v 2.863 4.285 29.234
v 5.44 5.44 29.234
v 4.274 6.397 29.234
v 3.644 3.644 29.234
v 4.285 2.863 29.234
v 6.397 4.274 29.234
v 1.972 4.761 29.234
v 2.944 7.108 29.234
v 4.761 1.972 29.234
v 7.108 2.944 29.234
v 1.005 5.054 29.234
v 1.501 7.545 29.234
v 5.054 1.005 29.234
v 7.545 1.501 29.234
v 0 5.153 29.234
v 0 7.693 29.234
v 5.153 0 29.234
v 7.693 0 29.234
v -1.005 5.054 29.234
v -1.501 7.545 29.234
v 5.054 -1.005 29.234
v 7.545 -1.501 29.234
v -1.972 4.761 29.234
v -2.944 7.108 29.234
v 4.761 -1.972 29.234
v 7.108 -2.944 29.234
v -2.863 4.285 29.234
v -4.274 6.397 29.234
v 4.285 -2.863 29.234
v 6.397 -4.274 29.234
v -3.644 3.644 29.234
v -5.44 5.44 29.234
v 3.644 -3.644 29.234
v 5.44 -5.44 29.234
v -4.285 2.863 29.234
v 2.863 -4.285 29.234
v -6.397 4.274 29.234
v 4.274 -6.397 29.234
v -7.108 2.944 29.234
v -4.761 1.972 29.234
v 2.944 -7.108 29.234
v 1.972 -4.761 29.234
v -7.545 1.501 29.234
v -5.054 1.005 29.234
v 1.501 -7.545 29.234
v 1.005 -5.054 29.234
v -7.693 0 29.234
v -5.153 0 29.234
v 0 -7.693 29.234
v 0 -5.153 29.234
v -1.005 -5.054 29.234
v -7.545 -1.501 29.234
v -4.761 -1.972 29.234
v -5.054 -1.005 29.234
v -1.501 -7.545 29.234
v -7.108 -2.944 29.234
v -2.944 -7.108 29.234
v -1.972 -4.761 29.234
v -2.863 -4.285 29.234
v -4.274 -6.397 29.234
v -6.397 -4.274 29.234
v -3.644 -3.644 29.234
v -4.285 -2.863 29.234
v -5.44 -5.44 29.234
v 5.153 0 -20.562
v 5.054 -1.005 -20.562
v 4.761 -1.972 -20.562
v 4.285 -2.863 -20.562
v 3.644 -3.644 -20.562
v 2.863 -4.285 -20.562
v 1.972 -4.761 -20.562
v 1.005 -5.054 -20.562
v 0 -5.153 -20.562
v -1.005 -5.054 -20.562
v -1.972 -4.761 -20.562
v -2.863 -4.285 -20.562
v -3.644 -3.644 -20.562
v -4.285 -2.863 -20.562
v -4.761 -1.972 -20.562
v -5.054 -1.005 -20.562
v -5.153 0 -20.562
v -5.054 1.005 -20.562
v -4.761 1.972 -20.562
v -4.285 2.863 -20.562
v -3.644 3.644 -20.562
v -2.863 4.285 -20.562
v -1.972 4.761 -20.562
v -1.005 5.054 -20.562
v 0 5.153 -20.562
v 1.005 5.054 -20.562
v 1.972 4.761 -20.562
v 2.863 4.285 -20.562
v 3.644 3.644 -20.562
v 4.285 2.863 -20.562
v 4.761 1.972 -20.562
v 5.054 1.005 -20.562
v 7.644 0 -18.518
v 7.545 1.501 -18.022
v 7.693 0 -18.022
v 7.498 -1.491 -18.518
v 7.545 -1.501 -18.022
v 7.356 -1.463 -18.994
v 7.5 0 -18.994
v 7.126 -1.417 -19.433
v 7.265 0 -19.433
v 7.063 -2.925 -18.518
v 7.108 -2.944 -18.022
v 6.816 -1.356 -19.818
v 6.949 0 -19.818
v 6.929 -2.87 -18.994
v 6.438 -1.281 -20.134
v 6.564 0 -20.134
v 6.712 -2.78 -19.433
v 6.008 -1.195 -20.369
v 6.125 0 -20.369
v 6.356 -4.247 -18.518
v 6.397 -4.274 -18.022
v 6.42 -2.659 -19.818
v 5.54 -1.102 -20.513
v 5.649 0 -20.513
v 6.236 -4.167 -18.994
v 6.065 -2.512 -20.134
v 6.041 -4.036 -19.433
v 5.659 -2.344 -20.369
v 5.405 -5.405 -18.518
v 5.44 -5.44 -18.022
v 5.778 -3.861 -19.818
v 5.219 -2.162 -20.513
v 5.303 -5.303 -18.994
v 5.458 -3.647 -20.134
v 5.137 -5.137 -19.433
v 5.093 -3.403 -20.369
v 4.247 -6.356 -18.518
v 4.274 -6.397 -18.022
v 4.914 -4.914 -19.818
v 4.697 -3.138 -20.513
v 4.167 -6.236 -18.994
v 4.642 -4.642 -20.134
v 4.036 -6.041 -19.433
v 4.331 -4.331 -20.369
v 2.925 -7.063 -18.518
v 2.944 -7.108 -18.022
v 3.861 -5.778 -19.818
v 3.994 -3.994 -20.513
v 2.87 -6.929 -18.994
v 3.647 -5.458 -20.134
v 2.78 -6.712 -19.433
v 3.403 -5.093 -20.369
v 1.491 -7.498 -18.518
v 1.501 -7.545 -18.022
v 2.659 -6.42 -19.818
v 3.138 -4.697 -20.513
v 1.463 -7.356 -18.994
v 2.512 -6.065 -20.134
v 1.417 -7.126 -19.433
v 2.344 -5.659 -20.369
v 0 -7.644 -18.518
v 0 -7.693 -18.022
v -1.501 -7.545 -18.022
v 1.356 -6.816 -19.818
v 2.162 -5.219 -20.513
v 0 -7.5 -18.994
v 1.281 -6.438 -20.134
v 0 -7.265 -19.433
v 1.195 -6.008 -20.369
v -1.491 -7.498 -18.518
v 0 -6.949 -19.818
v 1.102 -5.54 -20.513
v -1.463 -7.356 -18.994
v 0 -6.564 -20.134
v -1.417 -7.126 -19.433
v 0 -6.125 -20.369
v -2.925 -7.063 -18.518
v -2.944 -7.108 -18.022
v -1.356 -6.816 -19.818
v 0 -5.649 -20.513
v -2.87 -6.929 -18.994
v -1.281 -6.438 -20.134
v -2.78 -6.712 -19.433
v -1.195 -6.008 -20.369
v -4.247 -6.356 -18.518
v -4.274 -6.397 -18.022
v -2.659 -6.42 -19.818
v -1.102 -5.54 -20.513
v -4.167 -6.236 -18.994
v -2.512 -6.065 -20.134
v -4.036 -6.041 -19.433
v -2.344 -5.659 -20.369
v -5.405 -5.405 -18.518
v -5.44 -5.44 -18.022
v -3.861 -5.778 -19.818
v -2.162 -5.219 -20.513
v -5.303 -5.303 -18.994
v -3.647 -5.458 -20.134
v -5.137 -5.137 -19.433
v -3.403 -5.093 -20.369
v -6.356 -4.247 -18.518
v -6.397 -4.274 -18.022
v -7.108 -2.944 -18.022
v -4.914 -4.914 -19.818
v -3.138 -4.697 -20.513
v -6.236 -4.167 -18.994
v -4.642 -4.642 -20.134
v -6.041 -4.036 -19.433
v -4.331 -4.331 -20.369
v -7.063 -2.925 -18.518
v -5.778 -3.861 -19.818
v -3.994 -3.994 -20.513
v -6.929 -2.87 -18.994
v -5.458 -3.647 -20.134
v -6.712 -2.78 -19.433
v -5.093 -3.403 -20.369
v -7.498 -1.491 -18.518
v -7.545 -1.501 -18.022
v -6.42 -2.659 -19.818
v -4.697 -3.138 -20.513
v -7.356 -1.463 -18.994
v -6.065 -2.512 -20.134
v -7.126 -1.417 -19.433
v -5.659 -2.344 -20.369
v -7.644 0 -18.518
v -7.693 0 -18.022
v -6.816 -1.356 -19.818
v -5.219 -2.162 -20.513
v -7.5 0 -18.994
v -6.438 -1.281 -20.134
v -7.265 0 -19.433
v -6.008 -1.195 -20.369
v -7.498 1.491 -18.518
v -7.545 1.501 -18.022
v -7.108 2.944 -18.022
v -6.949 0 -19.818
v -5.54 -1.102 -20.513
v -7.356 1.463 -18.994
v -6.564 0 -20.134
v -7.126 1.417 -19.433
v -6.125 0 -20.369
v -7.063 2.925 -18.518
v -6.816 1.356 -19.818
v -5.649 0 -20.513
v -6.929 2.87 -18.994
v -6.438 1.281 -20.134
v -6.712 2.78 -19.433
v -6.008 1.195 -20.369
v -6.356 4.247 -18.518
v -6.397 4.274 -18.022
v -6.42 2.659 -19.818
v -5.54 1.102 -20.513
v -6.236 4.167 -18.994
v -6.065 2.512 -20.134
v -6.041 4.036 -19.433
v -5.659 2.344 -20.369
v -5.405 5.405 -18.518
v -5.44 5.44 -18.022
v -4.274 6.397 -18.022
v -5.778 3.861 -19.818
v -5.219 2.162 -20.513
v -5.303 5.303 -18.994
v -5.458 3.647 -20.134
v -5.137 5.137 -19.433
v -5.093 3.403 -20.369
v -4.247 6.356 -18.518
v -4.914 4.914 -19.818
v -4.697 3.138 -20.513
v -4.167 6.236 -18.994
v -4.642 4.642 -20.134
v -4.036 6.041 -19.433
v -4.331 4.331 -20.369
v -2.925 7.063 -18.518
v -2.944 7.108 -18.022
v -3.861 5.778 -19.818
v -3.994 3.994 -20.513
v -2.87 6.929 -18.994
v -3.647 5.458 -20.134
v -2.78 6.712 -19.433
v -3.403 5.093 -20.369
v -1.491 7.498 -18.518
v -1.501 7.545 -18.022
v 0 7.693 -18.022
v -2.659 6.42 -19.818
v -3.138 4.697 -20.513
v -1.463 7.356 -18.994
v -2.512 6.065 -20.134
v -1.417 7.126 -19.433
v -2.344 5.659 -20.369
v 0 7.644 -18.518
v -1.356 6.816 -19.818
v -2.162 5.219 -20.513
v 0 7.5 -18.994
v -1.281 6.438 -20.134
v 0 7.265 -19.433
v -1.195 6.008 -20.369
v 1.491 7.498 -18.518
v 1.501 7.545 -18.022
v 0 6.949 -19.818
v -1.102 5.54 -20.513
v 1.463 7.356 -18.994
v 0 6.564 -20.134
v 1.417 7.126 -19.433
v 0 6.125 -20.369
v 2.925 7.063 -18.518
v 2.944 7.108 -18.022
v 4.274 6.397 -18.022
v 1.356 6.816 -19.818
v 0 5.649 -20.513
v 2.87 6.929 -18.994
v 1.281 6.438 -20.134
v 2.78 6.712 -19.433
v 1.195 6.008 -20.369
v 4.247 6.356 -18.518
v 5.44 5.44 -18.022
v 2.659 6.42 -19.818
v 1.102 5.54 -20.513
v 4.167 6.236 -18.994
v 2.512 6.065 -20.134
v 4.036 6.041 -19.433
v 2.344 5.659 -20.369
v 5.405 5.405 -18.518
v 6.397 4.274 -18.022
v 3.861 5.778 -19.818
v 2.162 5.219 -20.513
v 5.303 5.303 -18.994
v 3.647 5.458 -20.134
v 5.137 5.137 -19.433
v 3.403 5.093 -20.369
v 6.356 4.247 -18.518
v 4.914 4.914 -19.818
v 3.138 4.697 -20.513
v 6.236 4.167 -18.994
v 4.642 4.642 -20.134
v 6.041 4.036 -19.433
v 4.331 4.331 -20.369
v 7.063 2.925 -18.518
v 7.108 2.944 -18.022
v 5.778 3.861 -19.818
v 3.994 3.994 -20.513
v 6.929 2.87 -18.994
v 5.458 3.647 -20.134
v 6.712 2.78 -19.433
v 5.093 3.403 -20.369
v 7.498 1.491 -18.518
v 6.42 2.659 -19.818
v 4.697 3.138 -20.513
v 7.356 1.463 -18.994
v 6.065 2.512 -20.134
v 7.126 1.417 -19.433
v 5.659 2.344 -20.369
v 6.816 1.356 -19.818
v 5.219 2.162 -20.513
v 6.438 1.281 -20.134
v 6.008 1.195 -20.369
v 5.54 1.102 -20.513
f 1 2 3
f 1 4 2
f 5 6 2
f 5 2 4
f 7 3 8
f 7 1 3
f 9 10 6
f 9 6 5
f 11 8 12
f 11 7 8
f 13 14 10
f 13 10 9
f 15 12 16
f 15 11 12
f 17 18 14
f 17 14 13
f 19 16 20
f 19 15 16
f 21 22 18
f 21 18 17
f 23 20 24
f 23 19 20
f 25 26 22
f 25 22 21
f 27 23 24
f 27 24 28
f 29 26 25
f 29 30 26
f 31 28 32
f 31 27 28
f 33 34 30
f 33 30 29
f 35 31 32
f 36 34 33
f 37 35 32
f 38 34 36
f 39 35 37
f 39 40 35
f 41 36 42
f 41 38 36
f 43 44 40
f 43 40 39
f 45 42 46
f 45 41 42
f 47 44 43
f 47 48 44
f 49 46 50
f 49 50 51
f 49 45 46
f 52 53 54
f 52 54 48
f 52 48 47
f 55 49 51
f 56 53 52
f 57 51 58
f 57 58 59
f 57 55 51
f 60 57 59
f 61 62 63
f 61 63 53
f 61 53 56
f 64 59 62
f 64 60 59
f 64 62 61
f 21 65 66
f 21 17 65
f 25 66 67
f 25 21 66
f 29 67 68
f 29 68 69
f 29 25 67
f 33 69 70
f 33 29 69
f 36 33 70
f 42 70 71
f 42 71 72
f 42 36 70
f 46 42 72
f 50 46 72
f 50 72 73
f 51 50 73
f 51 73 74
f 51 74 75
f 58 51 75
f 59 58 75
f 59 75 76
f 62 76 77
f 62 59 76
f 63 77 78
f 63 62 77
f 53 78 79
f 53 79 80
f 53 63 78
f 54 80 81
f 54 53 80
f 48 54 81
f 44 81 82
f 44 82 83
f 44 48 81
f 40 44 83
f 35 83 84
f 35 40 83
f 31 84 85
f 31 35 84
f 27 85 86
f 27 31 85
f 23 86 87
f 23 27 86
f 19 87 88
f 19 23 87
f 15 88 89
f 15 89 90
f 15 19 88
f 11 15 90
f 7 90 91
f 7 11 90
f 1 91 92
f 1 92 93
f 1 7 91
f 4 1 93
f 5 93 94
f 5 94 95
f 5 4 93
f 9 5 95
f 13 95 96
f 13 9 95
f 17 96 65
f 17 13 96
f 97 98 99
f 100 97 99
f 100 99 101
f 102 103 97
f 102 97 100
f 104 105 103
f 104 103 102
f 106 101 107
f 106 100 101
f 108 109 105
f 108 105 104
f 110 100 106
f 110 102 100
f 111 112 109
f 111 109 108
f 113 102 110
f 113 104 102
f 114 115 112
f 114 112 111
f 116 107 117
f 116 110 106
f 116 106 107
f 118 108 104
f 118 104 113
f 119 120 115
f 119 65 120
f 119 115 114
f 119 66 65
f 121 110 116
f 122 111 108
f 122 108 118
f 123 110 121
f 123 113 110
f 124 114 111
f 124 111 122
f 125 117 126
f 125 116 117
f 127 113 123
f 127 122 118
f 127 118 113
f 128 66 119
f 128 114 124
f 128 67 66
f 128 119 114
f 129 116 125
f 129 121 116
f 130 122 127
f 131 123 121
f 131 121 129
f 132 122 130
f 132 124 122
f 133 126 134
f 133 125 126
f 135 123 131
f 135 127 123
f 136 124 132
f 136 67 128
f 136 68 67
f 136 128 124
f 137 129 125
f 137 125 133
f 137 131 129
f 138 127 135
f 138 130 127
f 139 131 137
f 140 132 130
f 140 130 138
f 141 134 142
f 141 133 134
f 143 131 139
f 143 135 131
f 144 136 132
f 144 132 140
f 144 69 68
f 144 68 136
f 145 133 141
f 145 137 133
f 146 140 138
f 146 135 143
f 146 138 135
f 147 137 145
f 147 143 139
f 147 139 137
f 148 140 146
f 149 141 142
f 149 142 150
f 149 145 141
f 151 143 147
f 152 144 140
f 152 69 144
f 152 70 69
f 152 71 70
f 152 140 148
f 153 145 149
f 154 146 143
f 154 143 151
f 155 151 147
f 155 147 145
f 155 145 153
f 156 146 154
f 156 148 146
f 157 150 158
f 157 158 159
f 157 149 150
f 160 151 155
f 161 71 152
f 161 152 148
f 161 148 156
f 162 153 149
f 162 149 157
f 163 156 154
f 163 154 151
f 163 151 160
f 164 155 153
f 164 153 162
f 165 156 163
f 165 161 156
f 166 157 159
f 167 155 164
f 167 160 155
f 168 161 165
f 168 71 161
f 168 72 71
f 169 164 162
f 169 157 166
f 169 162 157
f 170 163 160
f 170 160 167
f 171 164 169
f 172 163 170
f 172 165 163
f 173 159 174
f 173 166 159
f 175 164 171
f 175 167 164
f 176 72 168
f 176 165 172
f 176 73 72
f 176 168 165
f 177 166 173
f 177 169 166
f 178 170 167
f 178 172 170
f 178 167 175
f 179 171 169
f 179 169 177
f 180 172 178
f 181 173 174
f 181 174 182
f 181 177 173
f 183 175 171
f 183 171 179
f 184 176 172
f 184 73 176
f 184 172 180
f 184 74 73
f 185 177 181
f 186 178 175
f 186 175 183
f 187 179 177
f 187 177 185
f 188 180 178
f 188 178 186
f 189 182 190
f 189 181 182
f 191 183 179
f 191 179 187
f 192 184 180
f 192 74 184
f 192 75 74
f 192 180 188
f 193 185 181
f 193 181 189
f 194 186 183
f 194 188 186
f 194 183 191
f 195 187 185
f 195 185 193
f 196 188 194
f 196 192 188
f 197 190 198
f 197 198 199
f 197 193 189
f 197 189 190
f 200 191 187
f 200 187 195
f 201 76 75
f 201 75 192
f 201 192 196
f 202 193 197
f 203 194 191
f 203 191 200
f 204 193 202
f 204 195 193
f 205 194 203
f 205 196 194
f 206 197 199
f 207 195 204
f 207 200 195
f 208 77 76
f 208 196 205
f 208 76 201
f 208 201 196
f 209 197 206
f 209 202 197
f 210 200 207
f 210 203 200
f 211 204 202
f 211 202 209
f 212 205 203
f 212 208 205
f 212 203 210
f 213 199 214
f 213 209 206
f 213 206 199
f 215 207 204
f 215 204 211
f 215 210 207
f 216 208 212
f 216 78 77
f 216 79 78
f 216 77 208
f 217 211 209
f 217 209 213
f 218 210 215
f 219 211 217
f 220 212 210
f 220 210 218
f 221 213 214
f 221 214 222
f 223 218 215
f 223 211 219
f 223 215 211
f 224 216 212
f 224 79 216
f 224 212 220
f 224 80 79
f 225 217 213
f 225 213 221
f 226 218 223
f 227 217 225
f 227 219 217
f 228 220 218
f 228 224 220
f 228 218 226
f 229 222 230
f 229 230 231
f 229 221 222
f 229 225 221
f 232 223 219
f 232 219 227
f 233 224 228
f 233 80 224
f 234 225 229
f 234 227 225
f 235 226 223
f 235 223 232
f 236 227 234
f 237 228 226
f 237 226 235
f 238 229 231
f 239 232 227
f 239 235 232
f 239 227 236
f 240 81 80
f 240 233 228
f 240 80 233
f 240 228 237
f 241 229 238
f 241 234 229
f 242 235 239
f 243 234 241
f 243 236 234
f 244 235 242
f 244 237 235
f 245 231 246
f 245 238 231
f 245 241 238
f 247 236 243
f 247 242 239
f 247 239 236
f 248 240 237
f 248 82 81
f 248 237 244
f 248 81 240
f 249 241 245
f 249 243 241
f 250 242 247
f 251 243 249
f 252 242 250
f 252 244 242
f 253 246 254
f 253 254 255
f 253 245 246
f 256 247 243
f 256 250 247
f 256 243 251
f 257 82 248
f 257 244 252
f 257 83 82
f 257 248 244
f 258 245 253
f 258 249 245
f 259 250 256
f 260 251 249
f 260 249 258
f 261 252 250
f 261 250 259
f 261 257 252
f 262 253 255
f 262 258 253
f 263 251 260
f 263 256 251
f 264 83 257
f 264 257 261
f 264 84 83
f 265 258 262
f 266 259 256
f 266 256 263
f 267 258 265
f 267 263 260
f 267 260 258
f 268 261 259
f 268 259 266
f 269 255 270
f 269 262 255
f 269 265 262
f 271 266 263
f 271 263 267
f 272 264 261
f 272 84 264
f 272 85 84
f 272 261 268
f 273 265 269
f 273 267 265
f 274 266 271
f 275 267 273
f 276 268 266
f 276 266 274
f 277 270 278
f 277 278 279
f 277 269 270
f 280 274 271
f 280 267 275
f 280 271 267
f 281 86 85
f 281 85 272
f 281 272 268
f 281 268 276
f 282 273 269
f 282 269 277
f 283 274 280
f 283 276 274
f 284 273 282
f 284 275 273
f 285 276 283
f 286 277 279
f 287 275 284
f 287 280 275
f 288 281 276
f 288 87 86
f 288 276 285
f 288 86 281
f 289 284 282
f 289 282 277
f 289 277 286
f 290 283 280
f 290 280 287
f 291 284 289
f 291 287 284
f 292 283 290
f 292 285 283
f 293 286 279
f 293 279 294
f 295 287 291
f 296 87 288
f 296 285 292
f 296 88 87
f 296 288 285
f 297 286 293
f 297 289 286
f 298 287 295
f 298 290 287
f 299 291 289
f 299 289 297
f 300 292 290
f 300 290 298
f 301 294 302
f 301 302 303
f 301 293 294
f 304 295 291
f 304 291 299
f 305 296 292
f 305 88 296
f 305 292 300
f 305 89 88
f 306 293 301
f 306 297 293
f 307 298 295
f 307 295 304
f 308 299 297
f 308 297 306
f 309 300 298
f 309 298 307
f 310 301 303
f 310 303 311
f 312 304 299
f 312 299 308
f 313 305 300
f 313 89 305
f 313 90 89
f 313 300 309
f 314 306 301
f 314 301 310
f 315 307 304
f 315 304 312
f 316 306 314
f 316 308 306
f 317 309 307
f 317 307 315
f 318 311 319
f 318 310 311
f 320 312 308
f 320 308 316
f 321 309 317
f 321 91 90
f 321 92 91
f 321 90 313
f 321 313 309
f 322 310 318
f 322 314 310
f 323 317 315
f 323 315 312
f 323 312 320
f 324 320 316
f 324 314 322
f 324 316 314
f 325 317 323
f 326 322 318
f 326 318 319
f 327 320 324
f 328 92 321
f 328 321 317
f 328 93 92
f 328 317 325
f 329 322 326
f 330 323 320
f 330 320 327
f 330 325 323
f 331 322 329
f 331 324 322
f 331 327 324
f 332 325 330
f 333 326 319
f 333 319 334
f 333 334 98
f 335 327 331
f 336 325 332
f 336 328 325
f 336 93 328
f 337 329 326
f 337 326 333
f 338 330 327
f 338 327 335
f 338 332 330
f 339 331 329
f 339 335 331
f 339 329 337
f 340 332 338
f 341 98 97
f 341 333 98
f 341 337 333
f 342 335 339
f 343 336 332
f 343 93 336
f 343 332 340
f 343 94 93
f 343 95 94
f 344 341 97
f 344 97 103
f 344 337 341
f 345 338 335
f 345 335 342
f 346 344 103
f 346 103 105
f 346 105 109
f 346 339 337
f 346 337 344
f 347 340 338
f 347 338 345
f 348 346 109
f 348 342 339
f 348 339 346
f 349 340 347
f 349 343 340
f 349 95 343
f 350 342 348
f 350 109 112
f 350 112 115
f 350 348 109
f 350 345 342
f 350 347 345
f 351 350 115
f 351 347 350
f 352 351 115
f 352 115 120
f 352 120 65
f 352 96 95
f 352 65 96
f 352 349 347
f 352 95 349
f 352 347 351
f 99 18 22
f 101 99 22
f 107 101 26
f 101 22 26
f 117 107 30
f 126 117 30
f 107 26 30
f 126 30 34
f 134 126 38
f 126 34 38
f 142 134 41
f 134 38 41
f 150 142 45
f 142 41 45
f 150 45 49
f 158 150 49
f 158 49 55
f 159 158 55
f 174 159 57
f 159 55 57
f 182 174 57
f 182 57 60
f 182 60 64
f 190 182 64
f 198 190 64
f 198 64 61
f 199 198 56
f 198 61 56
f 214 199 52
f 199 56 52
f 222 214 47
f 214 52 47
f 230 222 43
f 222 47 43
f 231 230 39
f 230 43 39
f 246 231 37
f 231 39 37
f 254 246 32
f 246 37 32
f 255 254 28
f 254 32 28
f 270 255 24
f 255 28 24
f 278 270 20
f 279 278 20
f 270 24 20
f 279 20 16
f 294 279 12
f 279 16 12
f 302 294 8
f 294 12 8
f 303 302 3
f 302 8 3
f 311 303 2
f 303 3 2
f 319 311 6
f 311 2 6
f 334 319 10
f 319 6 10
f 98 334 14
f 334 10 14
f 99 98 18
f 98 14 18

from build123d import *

# Parameters (mm, degrees)
F0_W = 7.6932697557
F0_H = 49.7964322567
F2_T = -2.54
F3_R = 2.53999


# Not quite as in the source:
# - a fillet or chamfer is up to 0.001 mm smaller than in the source, because OpenCascade refuses the exact size


with BuildPart() as f1:
    # F0 (on Front) → F1 (revolve)
    with BuildSketch(Plane.XZ):
        with Locations((3.8466348778, 4.3362062424)):
            Rectangle(F0_W, F0_H)
    revolve(axis=Axis((0, 0, 4.3362062424), (0, 0, -1)))

    # F2
    f2_openings = [f1.faces().sort_by_distance(p)[0] for p in [
        (0, 0, 29.234422),
        (0, 0, -20.56201),
    ]]
    offset(amount=F2_T, openings=f2_openings)

    # F3 (radius 2.54 in the source; OpenCascade refuses exactly that, so slightly less here)
    f3_edges = [f1.edges().sort_by_distance(p)[0] for p in [
        (-7.69327, 0, -20.56201),
    ]]
    fillet(f3_edges, radius=F3_R)


solid = f1.part
